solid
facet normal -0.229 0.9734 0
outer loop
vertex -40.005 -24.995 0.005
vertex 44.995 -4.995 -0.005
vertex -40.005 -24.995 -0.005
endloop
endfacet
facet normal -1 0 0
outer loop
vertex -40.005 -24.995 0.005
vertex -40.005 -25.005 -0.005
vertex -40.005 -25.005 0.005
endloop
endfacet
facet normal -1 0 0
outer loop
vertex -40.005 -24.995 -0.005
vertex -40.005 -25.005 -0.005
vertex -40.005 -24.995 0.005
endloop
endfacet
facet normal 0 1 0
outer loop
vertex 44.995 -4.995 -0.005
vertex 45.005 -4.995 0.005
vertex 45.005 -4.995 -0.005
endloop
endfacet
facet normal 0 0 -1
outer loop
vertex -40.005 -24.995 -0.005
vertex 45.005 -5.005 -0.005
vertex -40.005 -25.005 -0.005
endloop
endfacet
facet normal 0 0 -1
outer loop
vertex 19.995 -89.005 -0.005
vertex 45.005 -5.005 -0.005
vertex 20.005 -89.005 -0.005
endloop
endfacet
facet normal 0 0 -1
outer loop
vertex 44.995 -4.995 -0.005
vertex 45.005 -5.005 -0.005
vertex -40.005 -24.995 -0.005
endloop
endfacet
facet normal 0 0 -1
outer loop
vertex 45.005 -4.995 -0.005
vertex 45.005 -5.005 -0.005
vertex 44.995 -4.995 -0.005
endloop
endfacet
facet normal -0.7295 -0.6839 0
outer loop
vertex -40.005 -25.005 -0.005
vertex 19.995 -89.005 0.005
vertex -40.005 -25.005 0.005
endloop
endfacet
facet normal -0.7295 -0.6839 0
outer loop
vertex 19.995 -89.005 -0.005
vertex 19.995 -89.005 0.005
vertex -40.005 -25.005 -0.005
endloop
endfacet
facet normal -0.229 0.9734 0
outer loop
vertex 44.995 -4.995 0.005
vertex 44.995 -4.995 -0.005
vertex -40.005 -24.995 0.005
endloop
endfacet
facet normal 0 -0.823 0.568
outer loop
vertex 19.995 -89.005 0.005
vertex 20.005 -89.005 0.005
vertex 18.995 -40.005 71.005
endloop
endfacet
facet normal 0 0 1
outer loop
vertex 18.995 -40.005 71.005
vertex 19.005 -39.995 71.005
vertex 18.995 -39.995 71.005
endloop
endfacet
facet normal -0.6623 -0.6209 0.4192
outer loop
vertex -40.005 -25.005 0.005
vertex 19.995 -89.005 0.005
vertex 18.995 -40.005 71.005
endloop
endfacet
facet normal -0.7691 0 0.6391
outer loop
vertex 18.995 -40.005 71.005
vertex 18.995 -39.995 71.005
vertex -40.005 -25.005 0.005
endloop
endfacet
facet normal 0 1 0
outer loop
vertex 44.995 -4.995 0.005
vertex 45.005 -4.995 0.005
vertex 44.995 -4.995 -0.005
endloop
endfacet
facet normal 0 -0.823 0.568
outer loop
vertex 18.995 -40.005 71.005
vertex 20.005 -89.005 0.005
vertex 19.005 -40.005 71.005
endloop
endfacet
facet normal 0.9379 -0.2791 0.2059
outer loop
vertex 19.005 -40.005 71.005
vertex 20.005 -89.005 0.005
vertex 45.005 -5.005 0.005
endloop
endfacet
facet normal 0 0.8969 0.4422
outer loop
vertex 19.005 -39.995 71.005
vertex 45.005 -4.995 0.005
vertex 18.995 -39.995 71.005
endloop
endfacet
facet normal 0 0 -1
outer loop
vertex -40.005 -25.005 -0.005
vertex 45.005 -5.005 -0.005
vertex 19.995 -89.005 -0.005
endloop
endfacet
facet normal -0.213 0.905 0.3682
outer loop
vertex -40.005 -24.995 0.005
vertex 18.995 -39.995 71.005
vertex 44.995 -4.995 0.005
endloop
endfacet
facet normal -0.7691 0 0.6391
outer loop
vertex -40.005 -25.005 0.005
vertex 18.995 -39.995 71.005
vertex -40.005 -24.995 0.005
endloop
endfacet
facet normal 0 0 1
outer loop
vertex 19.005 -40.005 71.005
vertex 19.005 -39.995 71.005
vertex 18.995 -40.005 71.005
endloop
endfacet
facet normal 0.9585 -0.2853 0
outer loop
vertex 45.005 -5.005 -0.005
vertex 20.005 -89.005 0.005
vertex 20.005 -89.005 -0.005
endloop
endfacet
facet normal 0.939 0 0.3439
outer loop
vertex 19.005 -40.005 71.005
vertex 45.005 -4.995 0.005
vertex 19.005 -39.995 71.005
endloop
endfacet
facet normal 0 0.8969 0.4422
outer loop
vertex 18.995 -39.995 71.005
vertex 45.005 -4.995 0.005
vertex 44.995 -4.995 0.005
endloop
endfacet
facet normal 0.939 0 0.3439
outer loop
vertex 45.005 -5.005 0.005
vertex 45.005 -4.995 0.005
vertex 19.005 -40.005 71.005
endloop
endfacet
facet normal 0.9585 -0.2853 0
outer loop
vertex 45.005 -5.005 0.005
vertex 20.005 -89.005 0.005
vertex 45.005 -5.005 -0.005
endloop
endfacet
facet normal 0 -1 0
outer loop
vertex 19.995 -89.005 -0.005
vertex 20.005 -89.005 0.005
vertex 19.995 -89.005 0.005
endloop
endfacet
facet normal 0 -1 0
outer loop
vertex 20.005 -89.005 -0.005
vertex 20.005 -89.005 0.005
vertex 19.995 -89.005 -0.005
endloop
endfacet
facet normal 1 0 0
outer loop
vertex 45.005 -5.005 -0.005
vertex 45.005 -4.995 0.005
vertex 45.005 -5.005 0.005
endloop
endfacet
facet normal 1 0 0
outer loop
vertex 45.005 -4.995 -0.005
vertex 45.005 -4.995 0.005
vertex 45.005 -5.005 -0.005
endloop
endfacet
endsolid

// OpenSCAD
u = 10;

hull() {
	translate([-4*u, -2.5*u, 0]) cube(0.01, center=true);
	translate([4.5*u, -0.5*u, 0]) cube(0.01, center=true);
	translate([2*u, -8.9*u, 0]) cube(0.01, center=true);
	translate([1.9*u, -4*u, 7.1*u]) cube(0.01, center=true);
}

%linear_extrude(height=9*u) hull() {
	translate([3*u, -0.5*u, 0]) square(0.01, center=true);
	translate([5*u, -5*u, 0]) square(0.01, center=true);
	translate([0.5*u, -7.1*u, 0]) square(0.01, center=true);
	translate([-1.5*u, -2.6*u, 0]) square(0.01, center=true);
}
